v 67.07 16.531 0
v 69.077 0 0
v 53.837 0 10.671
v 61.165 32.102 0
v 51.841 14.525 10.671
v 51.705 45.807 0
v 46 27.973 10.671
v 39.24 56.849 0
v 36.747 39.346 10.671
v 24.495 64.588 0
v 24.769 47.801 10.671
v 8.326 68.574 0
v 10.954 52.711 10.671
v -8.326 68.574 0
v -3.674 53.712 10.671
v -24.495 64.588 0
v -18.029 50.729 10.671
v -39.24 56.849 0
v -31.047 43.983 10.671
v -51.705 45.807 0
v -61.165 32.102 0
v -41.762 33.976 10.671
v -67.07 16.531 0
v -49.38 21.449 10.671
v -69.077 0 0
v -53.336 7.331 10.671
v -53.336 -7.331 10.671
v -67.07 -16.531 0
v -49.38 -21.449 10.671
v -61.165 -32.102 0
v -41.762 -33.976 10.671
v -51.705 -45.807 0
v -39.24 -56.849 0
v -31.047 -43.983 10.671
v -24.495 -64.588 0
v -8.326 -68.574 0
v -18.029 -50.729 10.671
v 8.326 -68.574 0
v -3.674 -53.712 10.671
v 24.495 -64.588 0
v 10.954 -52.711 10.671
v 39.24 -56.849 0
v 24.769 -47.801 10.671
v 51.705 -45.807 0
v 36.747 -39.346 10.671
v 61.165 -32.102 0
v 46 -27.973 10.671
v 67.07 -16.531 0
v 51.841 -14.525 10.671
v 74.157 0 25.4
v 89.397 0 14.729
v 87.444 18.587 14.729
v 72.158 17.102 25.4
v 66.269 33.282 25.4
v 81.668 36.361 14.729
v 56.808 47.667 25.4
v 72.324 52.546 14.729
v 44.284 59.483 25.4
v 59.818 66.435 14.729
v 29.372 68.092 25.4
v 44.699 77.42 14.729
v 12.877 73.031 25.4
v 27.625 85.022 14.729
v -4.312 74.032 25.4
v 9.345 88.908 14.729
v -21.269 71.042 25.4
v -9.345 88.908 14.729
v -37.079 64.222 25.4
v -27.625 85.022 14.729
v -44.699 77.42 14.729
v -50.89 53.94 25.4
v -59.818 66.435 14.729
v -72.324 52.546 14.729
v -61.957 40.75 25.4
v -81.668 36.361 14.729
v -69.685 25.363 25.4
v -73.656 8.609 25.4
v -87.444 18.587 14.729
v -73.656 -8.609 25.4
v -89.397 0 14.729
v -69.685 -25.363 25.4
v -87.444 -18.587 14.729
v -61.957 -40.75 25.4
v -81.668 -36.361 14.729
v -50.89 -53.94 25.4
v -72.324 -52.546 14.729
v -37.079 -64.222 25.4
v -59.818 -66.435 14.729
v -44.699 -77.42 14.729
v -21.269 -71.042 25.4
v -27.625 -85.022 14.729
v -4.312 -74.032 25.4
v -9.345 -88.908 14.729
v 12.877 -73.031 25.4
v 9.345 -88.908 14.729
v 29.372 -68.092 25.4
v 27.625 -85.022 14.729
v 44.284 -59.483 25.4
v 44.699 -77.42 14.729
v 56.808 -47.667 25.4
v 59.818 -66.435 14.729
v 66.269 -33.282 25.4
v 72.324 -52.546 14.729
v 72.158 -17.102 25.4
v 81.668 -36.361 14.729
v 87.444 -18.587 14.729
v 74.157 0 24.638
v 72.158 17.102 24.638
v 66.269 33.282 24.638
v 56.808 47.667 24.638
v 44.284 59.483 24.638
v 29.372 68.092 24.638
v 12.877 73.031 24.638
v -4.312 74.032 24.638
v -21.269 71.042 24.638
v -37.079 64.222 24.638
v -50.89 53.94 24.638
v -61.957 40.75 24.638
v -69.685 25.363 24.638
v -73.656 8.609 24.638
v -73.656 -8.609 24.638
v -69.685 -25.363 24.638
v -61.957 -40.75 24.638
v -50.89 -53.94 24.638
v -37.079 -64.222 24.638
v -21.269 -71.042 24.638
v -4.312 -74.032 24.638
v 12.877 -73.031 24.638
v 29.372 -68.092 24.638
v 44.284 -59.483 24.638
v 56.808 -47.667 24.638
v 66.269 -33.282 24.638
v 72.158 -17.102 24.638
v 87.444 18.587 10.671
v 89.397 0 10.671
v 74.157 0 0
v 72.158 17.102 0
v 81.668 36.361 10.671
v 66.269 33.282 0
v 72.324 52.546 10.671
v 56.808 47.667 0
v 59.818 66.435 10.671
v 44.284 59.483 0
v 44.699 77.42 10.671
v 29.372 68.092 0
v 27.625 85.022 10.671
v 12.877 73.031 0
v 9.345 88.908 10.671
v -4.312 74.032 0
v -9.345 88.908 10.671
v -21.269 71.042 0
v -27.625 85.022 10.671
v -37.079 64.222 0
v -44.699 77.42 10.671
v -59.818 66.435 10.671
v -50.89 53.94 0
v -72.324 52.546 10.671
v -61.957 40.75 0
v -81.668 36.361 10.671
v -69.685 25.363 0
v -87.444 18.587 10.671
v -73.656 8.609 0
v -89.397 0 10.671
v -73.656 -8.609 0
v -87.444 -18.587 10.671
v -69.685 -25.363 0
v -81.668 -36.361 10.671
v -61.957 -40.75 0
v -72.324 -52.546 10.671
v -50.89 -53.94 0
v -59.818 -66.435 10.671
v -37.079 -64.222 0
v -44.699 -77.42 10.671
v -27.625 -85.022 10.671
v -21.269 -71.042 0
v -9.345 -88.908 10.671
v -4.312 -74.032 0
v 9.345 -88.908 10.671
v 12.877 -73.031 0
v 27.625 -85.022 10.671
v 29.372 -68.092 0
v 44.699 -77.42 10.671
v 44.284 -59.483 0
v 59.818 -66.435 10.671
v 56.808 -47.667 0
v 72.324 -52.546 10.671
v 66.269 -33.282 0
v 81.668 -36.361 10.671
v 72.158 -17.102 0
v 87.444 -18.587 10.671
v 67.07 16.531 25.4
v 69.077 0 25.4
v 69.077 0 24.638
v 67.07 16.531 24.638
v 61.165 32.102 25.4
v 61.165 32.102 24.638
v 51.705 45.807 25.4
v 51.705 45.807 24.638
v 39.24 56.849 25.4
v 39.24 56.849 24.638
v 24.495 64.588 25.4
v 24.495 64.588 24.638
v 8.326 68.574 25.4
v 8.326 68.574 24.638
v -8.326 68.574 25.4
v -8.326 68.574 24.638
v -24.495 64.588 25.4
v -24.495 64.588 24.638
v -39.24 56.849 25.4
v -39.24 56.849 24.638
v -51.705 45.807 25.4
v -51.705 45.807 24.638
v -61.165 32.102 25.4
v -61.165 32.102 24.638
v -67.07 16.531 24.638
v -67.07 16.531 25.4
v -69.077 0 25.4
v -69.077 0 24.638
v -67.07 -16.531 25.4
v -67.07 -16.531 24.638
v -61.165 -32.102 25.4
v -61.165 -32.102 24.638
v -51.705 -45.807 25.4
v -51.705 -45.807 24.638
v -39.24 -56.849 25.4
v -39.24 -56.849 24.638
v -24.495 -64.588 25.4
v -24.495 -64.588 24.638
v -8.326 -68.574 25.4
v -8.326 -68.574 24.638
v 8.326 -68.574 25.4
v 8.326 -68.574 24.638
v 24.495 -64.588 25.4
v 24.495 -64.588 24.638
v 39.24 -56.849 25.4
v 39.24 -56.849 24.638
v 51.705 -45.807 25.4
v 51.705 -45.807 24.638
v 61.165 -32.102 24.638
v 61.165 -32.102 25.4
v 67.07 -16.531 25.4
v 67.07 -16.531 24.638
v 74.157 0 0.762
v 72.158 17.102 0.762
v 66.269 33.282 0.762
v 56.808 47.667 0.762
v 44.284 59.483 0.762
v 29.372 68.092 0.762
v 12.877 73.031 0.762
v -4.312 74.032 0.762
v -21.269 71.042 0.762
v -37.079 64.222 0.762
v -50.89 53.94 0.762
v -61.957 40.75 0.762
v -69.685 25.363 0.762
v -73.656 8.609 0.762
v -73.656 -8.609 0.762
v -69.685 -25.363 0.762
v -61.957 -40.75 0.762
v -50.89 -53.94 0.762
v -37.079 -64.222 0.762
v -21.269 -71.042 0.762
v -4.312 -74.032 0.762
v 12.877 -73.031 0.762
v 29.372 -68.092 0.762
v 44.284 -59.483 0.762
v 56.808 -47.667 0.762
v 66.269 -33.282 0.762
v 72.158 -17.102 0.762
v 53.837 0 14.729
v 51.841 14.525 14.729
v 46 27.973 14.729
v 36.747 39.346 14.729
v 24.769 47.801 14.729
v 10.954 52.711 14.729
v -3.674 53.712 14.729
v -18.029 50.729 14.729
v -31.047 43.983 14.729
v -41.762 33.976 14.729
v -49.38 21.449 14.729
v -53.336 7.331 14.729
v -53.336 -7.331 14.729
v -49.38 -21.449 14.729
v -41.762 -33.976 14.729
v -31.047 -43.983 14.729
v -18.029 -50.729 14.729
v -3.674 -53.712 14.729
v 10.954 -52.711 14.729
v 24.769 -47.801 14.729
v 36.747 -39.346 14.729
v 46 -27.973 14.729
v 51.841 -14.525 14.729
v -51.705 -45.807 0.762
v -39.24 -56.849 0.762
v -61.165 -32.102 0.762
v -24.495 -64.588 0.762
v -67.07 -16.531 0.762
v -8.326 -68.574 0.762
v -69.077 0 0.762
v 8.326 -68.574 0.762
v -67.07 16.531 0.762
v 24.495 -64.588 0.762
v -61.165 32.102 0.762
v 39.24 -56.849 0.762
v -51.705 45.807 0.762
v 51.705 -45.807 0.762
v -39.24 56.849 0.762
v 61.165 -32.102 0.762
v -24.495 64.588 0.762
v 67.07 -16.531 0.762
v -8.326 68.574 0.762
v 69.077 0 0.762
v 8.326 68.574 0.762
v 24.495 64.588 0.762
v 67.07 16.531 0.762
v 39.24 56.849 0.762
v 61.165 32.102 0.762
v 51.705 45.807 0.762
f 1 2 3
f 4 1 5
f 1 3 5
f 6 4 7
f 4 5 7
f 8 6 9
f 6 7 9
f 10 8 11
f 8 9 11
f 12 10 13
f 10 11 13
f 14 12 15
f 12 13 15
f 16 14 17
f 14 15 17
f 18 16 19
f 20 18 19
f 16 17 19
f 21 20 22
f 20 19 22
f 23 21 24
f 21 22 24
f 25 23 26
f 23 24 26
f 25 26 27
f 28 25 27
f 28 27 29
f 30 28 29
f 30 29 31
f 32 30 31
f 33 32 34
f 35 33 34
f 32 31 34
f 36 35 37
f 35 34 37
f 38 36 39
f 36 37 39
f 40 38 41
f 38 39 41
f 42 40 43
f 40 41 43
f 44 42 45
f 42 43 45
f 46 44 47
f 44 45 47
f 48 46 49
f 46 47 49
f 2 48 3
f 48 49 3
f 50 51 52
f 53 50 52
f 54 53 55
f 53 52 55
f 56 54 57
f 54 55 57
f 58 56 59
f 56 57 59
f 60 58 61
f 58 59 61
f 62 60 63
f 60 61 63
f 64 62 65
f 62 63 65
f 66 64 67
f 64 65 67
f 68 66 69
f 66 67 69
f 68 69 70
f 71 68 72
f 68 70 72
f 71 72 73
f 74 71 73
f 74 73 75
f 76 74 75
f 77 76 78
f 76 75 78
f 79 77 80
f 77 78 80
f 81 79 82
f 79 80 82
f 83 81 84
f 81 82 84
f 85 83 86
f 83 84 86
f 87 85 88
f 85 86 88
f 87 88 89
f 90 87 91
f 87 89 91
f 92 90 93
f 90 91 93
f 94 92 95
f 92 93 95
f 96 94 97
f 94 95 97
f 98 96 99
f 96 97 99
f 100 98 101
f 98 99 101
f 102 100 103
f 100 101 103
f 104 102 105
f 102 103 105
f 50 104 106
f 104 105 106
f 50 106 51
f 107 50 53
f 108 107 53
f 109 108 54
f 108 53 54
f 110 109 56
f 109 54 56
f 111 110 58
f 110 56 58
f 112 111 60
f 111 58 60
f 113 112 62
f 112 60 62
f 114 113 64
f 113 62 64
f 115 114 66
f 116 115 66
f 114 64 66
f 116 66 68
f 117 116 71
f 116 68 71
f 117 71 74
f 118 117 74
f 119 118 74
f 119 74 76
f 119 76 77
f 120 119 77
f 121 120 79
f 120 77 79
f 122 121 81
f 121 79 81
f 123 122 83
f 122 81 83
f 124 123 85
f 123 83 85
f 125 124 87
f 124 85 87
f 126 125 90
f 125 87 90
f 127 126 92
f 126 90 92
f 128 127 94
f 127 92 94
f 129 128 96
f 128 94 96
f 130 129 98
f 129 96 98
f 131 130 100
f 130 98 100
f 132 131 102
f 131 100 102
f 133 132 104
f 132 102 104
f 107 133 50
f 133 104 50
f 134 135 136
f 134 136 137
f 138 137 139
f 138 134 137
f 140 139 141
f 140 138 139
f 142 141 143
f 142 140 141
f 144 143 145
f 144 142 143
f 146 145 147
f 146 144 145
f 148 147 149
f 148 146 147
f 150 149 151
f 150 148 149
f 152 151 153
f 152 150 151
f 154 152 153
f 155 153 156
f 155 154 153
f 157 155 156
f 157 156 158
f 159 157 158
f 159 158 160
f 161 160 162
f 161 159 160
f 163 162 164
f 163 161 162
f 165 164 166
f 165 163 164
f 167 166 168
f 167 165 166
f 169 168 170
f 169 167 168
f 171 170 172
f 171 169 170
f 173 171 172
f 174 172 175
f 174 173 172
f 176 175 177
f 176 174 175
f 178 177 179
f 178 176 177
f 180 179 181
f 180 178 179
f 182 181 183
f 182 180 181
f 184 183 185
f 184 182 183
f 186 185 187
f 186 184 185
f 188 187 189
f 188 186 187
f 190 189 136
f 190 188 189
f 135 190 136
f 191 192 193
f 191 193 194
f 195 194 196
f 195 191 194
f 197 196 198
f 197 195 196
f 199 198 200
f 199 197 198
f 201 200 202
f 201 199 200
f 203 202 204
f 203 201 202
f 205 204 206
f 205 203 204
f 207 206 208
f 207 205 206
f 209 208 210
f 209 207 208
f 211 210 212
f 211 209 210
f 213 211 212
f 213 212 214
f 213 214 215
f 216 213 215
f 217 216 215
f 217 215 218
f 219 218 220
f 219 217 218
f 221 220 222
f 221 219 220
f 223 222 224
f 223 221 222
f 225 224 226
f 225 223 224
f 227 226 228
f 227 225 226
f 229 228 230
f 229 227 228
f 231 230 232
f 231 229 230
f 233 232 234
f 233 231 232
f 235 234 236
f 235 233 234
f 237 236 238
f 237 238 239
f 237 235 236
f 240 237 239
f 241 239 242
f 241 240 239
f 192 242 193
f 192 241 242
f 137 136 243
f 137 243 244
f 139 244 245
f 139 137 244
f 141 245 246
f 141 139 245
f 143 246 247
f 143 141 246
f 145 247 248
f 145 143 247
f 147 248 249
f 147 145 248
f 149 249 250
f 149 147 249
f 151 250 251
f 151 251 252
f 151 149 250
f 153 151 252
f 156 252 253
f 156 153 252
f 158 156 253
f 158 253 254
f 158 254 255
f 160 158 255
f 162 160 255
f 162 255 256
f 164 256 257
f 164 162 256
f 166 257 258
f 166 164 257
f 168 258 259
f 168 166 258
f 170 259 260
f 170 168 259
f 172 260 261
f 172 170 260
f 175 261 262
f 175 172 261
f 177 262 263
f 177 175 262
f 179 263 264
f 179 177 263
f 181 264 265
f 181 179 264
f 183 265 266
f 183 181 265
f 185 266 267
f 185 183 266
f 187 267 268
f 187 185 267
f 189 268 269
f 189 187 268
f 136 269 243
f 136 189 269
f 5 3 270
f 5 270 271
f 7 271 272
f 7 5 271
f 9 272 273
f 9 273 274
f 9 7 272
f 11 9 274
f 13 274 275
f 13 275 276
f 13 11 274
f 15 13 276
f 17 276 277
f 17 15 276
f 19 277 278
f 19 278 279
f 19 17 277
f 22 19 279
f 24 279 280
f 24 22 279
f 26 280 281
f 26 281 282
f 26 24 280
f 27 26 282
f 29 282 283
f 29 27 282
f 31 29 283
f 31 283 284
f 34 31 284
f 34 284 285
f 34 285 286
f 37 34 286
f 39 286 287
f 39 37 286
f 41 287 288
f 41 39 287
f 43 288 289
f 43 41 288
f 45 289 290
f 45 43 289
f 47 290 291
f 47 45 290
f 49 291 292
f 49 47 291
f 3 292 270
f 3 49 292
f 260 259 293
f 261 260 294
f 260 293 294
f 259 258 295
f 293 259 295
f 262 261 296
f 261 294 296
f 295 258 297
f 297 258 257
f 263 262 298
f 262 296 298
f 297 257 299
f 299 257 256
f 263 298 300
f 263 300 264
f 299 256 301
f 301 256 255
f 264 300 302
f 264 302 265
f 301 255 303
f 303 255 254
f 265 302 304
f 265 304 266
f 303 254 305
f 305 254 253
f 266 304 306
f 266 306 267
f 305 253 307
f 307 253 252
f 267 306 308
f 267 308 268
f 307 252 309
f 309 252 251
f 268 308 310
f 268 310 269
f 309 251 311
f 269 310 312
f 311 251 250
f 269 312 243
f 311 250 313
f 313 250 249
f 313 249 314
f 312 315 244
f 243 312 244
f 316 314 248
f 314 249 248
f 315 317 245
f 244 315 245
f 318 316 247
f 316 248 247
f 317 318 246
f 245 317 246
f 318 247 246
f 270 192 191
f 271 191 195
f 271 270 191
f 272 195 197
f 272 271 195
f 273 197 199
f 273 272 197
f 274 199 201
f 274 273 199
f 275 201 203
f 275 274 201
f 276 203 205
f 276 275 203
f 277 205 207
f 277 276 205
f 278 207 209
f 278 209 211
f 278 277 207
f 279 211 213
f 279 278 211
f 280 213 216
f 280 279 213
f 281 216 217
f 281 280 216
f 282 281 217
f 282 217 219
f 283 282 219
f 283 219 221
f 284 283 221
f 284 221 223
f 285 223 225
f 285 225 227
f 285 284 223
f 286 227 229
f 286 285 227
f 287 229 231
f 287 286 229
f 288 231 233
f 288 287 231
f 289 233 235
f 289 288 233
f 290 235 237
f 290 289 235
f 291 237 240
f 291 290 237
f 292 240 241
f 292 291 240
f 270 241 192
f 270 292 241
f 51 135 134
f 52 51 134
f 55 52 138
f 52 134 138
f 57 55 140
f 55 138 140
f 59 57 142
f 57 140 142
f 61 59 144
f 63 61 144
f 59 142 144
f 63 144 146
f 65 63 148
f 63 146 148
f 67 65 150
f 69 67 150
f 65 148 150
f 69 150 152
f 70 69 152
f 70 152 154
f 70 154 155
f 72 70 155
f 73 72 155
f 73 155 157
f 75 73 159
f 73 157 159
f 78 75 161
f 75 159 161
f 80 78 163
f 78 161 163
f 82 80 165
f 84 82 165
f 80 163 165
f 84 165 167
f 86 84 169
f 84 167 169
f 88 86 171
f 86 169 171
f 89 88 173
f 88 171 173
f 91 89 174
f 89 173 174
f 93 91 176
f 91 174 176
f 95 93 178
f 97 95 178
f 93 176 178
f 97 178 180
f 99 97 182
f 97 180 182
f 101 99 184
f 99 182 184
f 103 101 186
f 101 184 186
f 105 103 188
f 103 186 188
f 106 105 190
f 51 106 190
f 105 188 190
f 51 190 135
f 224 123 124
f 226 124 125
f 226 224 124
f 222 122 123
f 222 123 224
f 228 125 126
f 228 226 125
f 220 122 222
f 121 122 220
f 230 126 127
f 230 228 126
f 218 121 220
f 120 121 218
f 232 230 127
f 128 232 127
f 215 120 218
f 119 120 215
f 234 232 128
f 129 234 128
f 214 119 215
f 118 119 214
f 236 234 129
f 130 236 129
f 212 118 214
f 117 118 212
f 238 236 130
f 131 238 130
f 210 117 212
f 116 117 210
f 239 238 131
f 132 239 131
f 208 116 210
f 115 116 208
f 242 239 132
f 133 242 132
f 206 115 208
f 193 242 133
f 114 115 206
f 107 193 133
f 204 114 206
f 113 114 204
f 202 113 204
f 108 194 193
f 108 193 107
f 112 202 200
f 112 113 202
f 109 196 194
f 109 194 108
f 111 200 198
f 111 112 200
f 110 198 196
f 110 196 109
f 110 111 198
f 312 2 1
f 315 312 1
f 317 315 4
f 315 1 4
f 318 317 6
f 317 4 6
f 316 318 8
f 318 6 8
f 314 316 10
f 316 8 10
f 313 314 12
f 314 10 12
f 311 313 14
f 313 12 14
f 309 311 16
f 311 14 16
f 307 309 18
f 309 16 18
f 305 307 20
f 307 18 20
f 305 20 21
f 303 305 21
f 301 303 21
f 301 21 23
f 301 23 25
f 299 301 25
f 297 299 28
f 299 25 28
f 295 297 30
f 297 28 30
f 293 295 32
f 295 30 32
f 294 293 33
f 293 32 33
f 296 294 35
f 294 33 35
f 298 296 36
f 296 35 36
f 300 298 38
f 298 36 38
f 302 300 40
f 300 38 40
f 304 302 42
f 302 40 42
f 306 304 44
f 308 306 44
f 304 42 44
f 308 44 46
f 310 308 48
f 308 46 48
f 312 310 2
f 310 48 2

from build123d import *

# Parameters (mm, degrees)
F0_R       = 89.3972749213
F0_R_2     = 53.8372732699
F1_DEPTH   = 25.4
F2_SIZE2   = 10.6711628823
F2_SIZE    = 15.24
F2_2_SIZE2 = 10.6711628823
F2_2_SIZE  = 15.24
F3_DEPTH   = 0.762
F4_DEPTH   = 0.762


with BuildPart() as f1:
    # F0 (on Top) → F1 (new body)
    with BuildSketch(Plane.XY):
        Circle(F0_R)
        Circle(F0_R_2, mode=Mode.SUBTRACT)
    extrude(amount=F1_DEPTH)

    # F2
    f2_edges = [f1.edges().sort_by_distance(p)[0] for p in [
        (-89.397275, 0, 25.4),
        (-53.837273, 0, 25.4),
    ]]
    f2_side = f1.faces().sort_by_distance((-86.868738, 0, 25.4))[0]
    chamfer(f2_edges, length=F2_SIZE, length2=F2_SIZE2, reference=f2_side)

    # F2#2
    f2_2_edges = [f1.edges().sort_by_distance(p)[0] for p in [
        (-89.397275, 0, 0),
        (-53.837273, 0, 0),
    ]]
    f2_2_side = f1.faces().sort_by_distance((-86.868738, 0, 0))[0]
    chamfer(f2_2_edges, length=F2_2_SIZE, length2=F2_2_SIZE2, reference=f2_2_side)

    # F3 (cut): faces of the model
    f3_faces = [f1.faces().sort_by_distance(p)[0] for p in [
        (-72.0597904424, 0, 25.4),
        (-72.0597904424, 0, 0),
    ]]
    extrude(f3_faces, amount=-F3_DEPTH, dir=(0, 0, 1), mode=Mode.SUBTRACT)

    # F4 (cut): a face of the model
    f4_faces = [f1.faces().sort_by_distance(p)[0] for p in [
        (-72.0597904424, 0, 0),
    ]]
    extrude(f4_faces, amount=-F4_DEPTH, mode=Mode.SUBTRACT)


solid = f1.part
